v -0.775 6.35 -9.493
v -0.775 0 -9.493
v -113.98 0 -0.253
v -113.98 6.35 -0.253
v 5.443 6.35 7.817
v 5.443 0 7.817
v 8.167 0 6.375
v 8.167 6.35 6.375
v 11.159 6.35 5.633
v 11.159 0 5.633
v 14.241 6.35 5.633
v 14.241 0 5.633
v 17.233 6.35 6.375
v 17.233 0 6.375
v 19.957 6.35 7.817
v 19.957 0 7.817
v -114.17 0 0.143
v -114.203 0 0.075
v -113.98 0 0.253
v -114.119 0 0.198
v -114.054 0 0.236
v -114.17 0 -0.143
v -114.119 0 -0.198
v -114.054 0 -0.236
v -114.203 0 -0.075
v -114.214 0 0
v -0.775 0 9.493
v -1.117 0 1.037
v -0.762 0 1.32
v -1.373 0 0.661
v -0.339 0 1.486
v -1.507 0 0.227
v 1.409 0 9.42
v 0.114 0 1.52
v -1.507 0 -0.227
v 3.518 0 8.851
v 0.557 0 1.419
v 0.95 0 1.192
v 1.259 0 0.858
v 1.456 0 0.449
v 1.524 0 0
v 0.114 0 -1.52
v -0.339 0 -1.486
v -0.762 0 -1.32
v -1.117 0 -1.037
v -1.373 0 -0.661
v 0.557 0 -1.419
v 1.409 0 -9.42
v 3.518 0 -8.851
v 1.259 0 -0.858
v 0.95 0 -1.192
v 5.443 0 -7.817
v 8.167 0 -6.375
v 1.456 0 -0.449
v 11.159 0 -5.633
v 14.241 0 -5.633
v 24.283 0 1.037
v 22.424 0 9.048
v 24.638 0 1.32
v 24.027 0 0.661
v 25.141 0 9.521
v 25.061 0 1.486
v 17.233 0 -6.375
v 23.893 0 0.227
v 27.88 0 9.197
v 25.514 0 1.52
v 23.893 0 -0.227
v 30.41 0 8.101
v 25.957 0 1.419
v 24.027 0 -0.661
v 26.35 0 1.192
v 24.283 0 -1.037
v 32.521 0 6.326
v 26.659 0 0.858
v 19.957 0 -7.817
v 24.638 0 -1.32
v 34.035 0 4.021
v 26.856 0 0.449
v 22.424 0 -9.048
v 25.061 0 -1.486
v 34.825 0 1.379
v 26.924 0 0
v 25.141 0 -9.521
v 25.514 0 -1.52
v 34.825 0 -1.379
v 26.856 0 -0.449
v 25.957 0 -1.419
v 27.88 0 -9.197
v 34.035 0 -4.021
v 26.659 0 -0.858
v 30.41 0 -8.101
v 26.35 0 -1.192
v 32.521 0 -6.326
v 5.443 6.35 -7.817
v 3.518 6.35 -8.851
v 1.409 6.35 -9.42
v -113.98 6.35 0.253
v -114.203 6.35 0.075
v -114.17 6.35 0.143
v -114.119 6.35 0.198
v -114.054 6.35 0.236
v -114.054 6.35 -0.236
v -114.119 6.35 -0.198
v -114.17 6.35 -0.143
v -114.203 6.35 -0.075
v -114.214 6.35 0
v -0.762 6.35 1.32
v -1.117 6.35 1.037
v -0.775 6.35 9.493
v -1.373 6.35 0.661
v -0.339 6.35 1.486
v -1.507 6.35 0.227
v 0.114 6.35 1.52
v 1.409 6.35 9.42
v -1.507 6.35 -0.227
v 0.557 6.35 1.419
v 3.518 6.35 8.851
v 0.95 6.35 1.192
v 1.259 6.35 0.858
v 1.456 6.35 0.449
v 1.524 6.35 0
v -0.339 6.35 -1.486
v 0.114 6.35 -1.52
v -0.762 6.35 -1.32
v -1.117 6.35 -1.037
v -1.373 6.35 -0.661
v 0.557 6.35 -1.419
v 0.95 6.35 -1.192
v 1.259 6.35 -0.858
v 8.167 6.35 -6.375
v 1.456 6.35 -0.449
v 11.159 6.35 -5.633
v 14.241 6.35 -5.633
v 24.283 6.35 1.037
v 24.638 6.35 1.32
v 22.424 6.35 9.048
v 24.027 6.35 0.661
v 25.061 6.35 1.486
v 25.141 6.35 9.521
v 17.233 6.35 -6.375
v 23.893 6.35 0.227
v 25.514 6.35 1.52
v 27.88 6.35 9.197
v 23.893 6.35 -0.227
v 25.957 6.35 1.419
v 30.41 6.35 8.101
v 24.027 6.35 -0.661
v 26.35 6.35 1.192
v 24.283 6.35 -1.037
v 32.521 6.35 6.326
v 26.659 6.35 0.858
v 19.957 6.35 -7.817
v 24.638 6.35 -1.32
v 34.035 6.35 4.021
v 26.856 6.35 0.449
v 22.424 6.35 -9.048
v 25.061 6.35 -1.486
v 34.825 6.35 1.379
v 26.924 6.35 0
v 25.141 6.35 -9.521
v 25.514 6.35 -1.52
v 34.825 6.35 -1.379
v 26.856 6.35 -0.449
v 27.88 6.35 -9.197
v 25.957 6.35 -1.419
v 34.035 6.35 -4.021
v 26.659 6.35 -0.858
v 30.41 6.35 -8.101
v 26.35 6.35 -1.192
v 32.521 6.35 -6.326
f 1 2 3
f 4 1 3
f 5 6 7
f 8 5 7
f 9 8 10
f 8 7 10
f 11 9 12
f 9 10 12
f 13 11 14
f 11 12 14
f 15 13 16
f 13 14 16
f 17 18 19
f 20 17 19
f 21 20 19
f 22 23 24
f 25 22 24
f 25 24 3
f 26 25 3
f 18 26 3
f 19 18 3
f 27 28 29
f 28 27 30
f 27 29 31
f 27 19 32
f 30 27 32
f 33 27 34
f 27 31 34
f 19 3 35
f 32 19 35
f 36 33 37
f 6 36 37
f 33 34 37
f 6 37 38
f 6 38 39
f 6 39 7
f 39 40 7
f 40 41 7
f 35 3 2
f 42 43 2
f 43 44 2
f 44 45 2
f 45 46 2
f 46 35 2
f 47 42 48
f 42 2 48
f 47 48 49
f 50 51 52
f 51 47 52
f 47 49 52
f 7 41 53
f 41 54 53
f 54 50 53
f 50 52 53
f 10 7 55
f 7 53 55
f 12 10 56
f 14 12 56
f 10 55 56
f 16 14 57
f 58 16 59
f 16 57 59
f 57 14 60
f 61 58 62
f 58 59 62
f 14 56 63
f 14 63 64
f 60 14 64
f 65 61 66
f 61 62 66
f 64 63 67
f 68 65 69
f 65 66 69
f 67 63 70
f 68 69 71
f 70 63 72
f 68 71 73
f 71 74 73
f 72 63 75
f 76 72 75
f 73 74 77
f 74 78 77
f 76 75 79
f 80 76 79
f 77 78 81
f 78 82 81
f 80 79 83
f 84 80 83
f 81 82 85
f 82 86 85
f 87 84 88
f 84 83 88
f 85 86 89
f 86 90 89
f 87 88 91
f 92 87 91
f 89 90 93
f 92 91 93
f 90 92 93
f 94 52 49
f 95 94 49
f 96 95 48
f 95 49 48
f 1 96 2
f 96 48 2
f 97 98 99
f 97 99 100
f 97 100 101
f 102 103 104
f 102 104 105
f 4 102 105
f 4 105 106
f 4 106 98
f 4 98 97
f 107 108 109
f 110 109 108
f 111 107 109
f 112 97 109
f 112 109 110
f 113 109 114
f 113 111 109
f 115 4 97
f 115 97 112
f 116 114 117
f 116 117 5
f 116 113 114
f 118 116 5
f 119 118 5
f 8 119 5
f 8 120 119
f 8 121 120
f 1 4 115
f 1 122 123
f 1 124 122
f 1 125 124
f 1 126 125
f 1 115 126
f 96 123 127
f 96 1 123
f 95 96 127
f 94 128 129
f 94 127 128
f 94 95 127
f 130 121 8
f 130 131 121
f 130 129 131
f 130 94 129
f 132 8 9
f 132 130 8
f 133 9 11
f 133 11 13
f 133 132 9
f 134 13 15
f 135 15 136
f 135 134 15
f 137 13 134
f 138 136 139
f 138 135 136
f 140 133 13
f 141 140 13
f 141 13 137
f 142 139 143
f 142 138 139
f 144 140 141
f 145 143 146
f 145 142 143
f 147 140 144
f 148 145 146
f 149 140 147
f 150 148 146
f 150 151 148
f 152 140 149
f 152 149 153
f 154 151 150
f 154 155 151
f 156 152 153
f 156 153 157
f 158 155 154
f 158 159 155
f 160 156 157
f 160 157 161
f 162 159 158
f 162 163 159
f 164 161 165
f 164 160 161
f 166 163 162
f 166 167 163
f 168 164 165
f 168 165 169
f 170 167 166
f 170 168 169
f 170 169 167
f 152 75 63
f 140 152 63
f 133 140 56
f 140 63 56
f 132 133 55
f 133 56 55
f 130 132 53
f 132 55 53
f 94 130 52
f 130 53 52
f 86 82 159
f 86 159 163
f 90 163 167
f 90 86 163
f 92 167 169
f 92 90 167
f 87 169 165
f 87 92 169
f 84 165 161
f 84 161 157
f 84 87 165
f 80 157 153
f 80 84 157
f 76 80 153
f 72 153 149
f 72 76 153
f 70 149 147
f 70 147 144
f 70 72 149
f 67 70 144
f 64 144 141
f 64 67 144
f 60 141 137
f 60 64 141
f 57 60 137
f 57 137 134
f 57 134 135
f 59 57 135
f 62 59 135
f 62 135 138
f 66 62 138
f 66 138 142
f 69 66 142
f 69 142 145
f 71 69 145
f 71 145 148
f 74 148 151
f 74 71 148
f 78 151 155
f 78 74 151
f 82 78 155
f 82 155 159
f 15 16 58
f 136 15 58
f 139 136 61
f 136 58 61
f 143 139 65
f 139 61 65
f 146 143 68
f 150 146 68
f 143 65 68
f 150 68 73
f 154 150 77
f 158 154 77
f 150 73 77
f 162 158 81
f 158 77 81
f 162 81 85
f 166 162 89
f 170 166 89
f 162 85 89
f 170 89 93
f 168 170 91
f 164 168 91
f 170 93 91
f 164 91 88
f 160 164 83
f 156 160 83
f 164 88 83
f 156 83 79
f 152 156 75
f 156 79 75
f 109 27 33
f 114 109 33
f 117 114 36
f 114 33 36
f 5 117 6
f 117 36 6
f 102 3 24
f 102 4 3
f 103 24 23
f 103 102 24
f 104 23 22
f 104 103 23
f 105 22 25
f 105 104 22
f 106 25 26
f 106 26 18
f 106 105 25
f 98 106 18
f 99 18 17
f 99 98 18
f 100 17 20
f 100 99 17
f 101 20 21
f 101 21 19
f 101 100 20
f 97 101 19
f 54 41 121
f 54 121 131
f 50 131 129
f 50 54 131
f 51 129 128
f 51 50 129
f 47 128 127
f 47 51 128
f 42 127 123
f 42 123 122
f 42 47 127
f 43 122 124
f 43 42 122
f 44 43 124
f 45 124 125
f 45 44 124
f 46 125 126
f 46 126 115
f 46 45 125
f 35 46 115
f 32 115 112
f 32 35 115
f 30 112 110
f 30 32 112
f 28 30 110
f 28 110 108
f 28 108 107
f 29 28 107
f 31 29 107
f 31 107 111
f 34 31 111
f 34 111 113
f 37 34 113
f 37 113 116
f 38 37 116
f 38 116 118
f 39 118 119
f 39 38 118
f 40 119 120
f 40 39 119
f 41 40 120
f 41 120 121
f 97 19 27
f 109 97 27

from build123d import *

# Parameters (mm, degrees)
SKETCH1_R           = 1.524
BOSS_EXTRUDE1_DEPTH = 6.35
FILLET1_R           = 0.254


with BuildPart() as part:
    # Sketch1 → Boss-Extrude1 (new body)
    with BuildSketch(Plane(origin=(0, 0, 0), x_dir=(1, 0, 0), z_dir=(0, 1, 0))):
        with BuildLine():
            Line((-0.774889862, 9.493427764), (-117.081961553, 0))
            Line((-117.081961553, 0), (-0.774889862, -9.493427764))
            ThreePointArc((-0.774889862, -9.493427764), (2.47998519, -9.19648294), (5.442857143, -7.816708458))
            ThreePointArc((5.442857143, -7.816708458), (12.7, -5.538986403), (19.957142857, -7.816708458))
            ThreePointArc((19.957142857, -7.816708458), (34.925, 0), (19.957142857, 7.816708458))
            ThreePointArc((19.957142857, 7.816708458), (12.7, 5.538986403), (5.442857143, 7.816708458))
            ThreePointArc((5.442857143, 7.816708458), (2.47998519, 9.19648294), (-0.774889862, 9.493427764))
        make_face()
        Circle(SKETCH1_R, mode=Mode.SUBTRACT)
        with Locations((25.4, 0)):
            Circle(SKETCH1_R, mode=Mode.SUBTRACT)
    extrude(amount=BOSS_EXTRUDE1_DEPTH)

    # Fillet1
    fillet1_edges = [part.edges().sort_by_distance(p)[0] for p in [
        (-117.081961553, 3.175, 0),
    ]]
    fillet(fillet1_edges, radius=FILLET1_R)


solid = part.part
